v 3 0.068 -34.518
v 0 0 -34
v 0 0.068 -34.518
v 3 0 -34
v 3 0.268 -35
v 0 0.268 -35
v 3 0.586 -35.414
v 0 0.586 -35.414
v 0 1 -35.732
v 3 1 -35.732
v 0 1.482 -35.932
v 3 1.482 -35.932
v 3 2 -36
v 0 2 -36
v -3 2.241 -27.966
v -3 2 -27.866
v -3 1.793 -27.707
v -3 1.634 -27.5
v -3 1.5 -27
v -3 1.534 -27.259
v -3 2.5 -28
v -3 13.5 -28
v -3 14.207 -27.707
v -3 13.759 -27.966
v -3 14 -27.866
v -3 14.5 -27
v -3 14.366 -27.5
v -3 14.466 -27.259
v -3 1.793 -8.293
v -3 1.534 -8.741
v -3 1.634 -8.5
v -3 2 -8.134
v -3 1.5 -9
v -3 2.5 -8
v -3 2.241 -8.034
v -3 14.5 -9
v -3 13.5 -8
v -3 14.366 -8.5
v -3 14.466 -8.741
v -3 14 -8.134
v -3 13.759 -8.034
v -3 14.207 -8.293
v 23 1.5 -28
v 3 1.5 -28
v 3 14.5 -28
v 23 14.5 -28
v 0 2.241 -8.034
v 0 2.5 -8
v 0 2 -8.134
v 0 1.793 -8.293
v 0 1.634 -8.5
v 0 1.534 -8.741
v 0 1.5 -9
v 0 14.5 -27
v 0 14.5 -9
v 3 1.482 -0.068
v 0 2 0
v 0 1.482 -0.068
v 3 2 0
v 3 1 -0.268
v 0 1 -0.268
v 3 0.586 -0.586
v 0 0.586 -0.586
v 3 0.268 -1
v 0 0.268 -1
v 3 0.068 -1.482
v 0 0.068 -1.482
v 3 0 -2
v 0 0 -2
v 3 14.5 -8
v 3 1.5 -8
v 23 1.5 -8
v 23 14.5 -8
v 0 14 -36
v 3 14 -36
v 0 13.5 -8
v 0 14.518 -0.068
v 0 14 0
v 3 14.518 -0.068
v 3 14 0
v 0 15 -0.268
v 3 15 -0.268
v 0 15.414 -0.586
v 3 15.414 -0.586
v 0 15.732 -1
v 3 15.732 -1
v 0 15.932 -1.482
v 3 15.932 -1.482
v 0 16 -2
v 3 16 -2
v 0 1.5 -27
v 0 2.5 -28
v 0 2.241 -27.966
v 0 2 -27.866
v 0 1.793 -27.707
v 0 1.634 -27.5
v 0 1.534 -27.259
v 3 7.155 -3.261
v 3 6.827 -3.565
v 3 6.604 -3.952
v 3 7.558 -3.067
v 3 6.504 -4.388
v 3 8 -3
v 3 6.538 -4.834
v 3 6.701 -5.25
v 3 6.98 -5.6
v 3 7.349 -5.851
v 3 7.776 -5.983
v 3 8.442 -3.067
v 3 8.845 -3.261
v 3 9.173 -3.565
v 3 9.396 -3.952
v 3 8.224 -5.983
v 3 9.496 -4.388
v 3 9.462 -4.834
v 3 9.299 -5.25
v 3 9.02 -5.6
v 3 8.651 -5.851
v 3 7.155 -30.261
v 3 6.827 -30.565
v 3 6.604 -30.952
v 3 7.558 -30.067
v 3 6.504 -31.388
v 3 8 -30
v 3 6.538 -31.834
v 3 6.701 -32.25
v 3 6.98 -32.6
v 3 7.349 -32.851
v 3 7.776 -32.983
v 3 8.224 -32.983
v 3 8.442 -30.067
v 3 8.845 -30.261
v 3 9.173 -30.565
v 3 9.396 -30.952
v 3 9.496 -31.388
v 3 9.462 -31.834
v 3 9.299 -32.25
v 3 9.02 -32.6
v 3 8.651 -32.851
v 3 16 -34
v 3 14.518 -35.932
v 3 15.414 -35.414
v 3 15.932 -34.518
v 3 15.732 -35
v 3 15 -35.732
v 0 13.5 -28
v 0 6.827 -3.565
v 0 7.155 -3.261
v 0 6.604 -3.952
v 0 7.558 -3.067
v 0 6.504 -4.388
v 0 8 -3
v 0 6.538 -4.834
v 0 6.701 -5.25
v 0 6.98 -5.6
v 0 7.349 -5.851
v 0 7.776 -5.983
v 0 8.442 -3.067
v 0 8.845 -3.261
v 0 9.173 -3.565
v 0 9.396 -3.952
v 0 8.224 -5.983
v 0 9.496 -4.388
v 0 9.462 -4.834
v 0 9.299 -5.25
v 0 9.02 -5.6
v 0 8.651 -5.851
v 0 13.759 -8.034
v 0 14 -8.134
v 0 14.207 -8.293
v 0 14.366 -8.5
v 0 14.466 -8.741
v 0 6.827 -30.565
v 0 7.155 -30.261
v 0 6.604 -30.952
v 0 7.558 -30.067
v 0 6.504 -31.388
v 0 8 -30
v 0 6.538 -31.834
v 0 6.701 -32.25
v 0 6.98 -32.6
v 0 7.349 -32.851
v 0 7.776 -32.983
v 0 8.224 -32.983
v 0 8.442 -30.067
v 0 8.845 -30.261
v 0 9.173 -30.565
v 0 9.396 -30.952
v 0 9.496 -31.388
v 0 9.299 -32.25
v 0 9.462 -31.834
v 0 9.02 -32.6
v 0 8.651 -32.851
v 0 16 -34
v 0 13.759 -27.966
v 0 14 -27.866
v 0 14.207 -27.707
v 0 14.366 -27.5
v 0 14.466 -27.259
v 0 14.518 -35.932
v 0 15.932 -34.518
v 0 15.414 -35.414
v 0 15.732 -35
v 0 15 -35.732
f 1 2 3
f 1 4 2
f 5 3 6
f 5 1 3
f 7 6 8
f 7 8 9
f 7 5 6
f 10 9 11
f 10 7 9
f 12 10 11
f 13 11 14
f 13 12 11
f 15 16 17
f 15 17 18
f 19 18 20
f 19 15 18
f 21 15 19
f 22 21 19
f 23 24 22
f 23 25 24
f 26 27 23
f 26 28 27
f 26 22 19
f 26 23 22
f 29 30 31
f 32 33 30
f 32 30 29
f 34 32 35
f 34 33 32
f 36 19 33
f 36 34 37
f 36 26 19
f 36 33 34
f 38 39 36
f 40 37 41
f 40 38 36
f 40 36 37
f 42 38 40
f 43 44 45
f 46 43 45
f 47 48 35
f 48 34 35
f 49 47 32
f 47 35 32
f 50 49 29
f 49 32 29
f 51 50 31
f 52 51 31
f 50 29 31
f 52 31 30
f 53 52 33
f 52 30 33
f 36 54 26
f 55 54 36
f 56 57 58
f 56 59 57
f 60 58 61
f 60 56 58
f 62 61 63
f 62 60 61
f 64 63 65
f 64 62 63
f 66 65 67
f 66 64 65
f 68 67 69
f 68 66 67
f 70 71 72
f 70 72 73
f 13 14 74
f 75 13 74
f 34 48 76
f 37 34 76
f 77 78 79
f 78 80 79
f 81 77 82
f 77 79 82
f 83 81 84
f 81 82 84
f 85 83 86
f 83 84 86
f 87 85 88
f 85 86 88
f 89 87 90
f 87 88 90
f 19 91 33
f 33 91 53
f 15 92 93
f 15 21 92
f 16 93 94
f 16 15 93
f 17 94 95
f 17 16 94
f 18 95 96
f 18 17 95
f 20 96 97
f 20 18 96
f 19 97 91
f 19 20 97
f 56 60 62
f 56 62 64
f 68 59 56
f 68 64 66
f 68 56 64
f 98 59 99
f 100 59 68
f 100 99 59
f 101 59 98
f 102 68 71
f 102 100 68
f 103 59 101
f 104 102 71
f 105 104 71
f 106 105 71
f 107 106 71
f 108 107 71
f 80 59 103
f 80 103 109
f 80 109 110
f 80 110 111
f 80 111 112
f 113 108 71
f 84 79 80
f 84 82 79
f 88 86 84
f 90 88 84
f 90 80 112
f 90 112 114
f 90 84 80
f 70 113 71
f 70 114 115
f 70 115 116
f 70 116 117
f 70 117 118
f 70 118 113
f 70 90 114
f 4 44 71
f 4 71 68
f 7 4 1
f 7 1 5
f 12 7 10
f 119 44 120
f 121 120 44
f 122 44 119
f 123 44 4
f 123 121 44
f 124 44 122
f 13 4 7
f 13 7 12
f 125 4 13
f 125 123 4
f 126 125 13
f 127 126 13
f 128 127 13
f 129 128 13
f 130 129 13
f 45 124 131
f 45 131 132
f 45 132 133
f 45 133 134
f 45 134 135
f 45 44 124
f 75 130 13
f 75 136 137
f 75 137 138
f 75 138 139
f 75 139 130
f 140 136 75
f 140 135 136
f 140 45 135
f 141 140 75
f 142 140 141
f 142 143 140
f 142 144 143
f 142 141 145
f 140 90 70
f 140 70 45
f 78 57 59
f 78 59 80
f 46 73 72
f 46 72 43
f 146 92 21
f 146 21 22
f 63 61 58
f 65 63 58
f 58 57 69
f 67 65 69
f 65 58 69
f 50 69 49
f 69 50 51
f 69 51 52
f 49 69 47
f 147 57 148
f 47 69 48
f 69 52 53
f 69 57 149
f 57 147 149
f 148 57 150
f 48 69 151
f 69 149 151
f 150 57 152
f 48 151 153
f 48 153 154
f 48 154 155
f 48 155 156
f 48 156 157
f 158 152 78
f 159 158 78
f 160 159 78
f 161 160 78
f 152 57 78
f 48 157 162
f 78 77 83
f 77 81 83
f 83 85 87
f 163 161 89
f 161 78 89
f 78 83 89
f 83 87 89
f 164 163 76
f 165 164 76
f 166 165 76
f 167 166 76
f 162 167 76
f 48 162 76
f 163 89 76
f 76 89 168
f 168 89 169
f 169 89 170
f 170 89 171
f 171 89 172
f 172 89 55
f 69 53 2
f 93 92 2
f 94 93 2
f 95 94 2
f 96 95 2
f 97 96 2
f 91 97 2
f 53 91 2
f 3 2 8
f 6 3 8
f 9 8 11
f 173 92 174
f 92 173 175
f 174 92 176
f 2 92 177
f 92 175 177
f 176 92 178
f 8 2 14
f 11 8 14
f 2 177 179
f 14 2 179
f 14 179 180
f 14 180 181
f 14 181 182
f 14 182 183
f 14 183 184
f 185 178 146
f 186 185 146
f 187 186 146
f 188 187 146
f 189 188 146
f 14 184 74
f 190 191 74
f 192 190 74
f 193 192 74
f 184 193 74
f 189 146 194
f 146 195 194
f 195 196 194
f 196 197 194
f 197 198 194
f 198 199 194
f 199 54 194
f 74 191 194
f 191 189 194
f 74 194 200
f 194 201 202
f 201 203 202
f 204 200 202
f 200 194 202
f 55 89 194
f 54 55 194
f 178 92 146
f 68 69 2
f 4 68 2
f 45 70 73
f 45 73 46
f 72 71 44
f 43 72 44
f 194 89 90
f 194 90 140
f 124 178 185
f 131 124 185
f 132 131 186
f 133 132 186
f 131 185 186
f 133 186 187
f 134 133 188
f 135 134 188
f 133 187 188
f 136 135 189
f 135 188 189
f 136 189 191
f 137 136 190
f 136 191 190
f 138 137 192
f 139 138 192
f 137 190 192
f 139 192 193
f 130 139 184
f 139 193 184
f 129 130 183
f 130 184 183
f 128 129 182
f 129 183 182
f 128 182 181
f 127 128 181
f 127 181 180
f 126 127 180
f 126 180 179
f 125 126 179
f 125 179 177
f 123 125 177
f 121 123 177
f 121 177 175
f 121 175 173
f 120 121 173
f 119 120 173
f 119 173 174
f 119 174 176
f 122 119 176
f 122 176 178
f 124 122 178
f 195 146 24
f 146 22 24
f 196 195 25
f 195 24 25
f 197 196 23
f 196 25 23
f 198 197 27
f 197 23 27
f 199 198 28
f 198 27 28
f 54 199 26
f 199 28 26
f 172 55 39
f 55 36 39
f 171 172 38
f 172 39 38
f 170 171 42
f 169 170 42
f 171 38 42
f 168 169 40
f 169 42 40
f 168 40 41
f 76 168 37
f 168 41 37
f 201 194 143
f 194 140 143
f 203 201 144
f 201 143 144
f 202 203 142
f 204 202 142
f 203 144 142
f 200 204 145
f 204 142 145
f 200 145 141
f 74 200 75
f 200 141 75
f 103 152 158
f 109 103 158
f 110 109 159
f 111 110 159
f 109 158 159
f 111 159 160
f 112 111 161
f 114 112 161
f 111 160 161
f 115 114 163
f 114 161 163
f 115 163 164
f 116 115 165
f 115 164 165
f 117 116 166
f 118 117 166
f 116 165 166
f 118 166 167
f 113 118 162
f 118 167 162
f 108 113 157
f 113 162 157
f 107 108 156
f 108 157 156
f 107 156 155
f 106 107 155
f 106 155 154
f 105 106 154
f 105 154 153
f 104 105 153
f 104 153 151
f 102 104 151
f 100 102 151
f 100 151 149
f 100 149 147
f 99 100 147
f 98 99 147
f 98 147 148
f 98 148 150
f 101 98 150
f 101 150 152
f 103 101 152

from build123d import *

# Parameters (mm, degrees)
SKETCH_1_W          = 36
SKETCH_1_H          = 16
EXTRUDE_1_DEPTH     = 3
SKETCH_2_W          = 20
SKETCH_2_H          = 13
EXTRUDE_2_DEPTH     = 3
SKETCH_3_W          = 20
SKETCH_3_H          = 13
EXTRUDE_3_DEPTH     = 20
FILLET_1_R          = 2
FILLET_2_R          = 1
SKETCH_4_R          = 1.5
CUT_EXTRUDE_1_DEPTH = 46.617978912


with BuildPart() as part:
    # 草图1 → 凸台-拉伸1 (new body)
    with BuildSketch(Plane(origin=(0, 0, 0), x_dir=(0, 0, -1), z_dir=(1, 0, 0))):
        with Locations((18, 8)):
            Rectangle(SKETCH_1_W, SKETCH_1_H)
    extrude(amount=EXTRUDE_1_DEPTH)

    # 草图2 → 凸台-拉伸2 (add)
    with BuildSketch(Plane.ZY):
        with Locations((-18, 8)):
            Rectangle(SKETCH_2_W, SKETCH_2_H)
    extrude(amount=EXTRUDE_2_DEPTH)

    # 草图3 → 凸台-拉伸3 (add)
    with BuildSketch(Plane(origin=(3, 0, 0), x_dir=(0, 0, -1), z_dir=(1, 0, 0))):
        with Locations((18, 8)):
            Rectangle(SKETCH_3_W, SKETCH_3_H)
    extrude(amount=EXTRUDE_3_DEPTH)

    # 圆角1
    fillet_1_edges = [part.edges().sort_by_distance(p)[0] for p in [
        (1.5, 16, 0),
        (1.5, 16, -36),
        (1.5, 0, -36),
        (1.5, 0, 0),
    ]]
    fillet(fillet_1_edges, radius=FILLET_1_R)

    # 圆角2
    fillet_2_edges = [part.edges().sort_by_distance(p)[0] for p in [
        (-1.5, 14.5, -28),
        (-1.5, 1.5, -28),
        (-1.5, 1.5, -8),
        (-1.5, 14.5, -8),
    ]]
    fillet(fillet_2_edges, radius=FILLET_2_R)

    # 草图4 → 切除-拉伸1 (cut, through all)
    with BuildSketch(Plane.ZY):
        with Locations((-31.5, 8)):
            Circle(SKETCH_4_R)
        with Locations((-4.5, 8)):
            Circle(SKETCH_4_R)
    extrude(amount=-CUT_EXTRUDE_1_DEPTH, mode=Mode.SUBTRACT)


solid = part.part
